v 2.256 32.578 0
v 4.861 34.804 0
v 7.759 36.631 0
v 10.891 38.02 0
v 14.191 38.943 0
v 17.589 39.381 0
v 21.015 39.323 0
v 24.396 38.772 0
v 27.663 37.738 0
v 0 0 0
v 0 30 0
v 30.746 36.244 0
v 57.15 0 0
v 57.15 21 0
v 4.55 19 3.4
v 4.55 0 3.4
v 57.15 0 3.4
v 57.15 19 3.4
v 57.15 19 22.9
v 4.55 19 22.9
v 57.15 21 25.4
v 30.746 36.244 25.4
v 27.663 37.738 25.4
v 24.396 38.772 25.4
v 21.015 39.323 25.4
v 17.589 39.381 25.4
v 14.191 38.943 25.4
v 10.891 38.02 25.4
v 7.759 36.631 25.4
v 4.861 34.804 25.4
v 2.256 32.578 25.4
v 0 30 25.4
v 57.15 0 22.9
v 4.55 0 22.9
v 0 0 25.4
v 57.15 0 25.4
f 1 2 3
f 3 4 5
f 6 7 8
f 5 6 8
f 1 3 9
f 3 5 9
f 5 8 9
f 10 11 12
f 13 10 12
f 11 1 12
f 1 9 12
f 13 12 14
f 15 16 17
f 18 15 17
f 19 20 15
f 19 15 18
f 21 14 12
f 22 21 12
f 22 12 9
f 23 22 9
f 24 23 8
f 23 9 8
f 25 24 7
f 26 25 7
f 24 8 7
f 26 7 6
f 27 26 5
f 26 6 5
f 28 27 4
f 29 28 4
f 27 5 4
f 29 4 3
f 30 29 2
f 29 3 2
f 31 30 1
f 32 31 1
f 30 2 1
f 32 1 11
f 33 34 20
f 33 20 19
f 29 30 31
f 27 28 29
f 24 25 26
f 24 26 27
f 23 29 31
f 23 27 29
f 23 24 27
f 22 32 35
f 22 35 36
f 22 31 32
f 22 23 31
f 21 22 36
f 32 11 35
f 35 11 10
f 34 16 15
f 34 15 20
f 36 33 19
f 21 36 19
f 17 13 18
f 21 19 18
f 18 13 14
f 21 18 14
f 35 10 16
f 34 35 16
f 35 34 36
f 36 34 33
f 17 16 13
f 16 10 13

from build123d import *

# Parameters (mm, degrees)
F1_DEPTH = 25.4
F2_W     = 52.6
F2_H     = 19.5
F3_DEPTH = 19


with BuildPart() as f1:
    # F0 (on Top) → F1 (new body)
    with BuildSketch(Plane.XY):
        with BuildLine():
            Line((0, 30), (0, 0))
            Line((0, 0), (57.15, 0))
            Line((57.15, 0), (57.15, 21))
            Line((57.15, 21), (30.746157, 36.244266))
            ThreePointArc((30.746157, 36.244266), (14.190828, 38.943421), (0, 30))
        make_face()
    extrude(amount=F1_DEPTH)

    # F2 (on face) → F3 (cut)
    with BuildSketch(Plane.XZ):
        with Locations((30.85, 13.15)):
            Rectangle(F2_W, F2_H)
    extrude(amount=-F3_DEPTH, mode=Mode.SUBTRACT)


solid = f1.part
